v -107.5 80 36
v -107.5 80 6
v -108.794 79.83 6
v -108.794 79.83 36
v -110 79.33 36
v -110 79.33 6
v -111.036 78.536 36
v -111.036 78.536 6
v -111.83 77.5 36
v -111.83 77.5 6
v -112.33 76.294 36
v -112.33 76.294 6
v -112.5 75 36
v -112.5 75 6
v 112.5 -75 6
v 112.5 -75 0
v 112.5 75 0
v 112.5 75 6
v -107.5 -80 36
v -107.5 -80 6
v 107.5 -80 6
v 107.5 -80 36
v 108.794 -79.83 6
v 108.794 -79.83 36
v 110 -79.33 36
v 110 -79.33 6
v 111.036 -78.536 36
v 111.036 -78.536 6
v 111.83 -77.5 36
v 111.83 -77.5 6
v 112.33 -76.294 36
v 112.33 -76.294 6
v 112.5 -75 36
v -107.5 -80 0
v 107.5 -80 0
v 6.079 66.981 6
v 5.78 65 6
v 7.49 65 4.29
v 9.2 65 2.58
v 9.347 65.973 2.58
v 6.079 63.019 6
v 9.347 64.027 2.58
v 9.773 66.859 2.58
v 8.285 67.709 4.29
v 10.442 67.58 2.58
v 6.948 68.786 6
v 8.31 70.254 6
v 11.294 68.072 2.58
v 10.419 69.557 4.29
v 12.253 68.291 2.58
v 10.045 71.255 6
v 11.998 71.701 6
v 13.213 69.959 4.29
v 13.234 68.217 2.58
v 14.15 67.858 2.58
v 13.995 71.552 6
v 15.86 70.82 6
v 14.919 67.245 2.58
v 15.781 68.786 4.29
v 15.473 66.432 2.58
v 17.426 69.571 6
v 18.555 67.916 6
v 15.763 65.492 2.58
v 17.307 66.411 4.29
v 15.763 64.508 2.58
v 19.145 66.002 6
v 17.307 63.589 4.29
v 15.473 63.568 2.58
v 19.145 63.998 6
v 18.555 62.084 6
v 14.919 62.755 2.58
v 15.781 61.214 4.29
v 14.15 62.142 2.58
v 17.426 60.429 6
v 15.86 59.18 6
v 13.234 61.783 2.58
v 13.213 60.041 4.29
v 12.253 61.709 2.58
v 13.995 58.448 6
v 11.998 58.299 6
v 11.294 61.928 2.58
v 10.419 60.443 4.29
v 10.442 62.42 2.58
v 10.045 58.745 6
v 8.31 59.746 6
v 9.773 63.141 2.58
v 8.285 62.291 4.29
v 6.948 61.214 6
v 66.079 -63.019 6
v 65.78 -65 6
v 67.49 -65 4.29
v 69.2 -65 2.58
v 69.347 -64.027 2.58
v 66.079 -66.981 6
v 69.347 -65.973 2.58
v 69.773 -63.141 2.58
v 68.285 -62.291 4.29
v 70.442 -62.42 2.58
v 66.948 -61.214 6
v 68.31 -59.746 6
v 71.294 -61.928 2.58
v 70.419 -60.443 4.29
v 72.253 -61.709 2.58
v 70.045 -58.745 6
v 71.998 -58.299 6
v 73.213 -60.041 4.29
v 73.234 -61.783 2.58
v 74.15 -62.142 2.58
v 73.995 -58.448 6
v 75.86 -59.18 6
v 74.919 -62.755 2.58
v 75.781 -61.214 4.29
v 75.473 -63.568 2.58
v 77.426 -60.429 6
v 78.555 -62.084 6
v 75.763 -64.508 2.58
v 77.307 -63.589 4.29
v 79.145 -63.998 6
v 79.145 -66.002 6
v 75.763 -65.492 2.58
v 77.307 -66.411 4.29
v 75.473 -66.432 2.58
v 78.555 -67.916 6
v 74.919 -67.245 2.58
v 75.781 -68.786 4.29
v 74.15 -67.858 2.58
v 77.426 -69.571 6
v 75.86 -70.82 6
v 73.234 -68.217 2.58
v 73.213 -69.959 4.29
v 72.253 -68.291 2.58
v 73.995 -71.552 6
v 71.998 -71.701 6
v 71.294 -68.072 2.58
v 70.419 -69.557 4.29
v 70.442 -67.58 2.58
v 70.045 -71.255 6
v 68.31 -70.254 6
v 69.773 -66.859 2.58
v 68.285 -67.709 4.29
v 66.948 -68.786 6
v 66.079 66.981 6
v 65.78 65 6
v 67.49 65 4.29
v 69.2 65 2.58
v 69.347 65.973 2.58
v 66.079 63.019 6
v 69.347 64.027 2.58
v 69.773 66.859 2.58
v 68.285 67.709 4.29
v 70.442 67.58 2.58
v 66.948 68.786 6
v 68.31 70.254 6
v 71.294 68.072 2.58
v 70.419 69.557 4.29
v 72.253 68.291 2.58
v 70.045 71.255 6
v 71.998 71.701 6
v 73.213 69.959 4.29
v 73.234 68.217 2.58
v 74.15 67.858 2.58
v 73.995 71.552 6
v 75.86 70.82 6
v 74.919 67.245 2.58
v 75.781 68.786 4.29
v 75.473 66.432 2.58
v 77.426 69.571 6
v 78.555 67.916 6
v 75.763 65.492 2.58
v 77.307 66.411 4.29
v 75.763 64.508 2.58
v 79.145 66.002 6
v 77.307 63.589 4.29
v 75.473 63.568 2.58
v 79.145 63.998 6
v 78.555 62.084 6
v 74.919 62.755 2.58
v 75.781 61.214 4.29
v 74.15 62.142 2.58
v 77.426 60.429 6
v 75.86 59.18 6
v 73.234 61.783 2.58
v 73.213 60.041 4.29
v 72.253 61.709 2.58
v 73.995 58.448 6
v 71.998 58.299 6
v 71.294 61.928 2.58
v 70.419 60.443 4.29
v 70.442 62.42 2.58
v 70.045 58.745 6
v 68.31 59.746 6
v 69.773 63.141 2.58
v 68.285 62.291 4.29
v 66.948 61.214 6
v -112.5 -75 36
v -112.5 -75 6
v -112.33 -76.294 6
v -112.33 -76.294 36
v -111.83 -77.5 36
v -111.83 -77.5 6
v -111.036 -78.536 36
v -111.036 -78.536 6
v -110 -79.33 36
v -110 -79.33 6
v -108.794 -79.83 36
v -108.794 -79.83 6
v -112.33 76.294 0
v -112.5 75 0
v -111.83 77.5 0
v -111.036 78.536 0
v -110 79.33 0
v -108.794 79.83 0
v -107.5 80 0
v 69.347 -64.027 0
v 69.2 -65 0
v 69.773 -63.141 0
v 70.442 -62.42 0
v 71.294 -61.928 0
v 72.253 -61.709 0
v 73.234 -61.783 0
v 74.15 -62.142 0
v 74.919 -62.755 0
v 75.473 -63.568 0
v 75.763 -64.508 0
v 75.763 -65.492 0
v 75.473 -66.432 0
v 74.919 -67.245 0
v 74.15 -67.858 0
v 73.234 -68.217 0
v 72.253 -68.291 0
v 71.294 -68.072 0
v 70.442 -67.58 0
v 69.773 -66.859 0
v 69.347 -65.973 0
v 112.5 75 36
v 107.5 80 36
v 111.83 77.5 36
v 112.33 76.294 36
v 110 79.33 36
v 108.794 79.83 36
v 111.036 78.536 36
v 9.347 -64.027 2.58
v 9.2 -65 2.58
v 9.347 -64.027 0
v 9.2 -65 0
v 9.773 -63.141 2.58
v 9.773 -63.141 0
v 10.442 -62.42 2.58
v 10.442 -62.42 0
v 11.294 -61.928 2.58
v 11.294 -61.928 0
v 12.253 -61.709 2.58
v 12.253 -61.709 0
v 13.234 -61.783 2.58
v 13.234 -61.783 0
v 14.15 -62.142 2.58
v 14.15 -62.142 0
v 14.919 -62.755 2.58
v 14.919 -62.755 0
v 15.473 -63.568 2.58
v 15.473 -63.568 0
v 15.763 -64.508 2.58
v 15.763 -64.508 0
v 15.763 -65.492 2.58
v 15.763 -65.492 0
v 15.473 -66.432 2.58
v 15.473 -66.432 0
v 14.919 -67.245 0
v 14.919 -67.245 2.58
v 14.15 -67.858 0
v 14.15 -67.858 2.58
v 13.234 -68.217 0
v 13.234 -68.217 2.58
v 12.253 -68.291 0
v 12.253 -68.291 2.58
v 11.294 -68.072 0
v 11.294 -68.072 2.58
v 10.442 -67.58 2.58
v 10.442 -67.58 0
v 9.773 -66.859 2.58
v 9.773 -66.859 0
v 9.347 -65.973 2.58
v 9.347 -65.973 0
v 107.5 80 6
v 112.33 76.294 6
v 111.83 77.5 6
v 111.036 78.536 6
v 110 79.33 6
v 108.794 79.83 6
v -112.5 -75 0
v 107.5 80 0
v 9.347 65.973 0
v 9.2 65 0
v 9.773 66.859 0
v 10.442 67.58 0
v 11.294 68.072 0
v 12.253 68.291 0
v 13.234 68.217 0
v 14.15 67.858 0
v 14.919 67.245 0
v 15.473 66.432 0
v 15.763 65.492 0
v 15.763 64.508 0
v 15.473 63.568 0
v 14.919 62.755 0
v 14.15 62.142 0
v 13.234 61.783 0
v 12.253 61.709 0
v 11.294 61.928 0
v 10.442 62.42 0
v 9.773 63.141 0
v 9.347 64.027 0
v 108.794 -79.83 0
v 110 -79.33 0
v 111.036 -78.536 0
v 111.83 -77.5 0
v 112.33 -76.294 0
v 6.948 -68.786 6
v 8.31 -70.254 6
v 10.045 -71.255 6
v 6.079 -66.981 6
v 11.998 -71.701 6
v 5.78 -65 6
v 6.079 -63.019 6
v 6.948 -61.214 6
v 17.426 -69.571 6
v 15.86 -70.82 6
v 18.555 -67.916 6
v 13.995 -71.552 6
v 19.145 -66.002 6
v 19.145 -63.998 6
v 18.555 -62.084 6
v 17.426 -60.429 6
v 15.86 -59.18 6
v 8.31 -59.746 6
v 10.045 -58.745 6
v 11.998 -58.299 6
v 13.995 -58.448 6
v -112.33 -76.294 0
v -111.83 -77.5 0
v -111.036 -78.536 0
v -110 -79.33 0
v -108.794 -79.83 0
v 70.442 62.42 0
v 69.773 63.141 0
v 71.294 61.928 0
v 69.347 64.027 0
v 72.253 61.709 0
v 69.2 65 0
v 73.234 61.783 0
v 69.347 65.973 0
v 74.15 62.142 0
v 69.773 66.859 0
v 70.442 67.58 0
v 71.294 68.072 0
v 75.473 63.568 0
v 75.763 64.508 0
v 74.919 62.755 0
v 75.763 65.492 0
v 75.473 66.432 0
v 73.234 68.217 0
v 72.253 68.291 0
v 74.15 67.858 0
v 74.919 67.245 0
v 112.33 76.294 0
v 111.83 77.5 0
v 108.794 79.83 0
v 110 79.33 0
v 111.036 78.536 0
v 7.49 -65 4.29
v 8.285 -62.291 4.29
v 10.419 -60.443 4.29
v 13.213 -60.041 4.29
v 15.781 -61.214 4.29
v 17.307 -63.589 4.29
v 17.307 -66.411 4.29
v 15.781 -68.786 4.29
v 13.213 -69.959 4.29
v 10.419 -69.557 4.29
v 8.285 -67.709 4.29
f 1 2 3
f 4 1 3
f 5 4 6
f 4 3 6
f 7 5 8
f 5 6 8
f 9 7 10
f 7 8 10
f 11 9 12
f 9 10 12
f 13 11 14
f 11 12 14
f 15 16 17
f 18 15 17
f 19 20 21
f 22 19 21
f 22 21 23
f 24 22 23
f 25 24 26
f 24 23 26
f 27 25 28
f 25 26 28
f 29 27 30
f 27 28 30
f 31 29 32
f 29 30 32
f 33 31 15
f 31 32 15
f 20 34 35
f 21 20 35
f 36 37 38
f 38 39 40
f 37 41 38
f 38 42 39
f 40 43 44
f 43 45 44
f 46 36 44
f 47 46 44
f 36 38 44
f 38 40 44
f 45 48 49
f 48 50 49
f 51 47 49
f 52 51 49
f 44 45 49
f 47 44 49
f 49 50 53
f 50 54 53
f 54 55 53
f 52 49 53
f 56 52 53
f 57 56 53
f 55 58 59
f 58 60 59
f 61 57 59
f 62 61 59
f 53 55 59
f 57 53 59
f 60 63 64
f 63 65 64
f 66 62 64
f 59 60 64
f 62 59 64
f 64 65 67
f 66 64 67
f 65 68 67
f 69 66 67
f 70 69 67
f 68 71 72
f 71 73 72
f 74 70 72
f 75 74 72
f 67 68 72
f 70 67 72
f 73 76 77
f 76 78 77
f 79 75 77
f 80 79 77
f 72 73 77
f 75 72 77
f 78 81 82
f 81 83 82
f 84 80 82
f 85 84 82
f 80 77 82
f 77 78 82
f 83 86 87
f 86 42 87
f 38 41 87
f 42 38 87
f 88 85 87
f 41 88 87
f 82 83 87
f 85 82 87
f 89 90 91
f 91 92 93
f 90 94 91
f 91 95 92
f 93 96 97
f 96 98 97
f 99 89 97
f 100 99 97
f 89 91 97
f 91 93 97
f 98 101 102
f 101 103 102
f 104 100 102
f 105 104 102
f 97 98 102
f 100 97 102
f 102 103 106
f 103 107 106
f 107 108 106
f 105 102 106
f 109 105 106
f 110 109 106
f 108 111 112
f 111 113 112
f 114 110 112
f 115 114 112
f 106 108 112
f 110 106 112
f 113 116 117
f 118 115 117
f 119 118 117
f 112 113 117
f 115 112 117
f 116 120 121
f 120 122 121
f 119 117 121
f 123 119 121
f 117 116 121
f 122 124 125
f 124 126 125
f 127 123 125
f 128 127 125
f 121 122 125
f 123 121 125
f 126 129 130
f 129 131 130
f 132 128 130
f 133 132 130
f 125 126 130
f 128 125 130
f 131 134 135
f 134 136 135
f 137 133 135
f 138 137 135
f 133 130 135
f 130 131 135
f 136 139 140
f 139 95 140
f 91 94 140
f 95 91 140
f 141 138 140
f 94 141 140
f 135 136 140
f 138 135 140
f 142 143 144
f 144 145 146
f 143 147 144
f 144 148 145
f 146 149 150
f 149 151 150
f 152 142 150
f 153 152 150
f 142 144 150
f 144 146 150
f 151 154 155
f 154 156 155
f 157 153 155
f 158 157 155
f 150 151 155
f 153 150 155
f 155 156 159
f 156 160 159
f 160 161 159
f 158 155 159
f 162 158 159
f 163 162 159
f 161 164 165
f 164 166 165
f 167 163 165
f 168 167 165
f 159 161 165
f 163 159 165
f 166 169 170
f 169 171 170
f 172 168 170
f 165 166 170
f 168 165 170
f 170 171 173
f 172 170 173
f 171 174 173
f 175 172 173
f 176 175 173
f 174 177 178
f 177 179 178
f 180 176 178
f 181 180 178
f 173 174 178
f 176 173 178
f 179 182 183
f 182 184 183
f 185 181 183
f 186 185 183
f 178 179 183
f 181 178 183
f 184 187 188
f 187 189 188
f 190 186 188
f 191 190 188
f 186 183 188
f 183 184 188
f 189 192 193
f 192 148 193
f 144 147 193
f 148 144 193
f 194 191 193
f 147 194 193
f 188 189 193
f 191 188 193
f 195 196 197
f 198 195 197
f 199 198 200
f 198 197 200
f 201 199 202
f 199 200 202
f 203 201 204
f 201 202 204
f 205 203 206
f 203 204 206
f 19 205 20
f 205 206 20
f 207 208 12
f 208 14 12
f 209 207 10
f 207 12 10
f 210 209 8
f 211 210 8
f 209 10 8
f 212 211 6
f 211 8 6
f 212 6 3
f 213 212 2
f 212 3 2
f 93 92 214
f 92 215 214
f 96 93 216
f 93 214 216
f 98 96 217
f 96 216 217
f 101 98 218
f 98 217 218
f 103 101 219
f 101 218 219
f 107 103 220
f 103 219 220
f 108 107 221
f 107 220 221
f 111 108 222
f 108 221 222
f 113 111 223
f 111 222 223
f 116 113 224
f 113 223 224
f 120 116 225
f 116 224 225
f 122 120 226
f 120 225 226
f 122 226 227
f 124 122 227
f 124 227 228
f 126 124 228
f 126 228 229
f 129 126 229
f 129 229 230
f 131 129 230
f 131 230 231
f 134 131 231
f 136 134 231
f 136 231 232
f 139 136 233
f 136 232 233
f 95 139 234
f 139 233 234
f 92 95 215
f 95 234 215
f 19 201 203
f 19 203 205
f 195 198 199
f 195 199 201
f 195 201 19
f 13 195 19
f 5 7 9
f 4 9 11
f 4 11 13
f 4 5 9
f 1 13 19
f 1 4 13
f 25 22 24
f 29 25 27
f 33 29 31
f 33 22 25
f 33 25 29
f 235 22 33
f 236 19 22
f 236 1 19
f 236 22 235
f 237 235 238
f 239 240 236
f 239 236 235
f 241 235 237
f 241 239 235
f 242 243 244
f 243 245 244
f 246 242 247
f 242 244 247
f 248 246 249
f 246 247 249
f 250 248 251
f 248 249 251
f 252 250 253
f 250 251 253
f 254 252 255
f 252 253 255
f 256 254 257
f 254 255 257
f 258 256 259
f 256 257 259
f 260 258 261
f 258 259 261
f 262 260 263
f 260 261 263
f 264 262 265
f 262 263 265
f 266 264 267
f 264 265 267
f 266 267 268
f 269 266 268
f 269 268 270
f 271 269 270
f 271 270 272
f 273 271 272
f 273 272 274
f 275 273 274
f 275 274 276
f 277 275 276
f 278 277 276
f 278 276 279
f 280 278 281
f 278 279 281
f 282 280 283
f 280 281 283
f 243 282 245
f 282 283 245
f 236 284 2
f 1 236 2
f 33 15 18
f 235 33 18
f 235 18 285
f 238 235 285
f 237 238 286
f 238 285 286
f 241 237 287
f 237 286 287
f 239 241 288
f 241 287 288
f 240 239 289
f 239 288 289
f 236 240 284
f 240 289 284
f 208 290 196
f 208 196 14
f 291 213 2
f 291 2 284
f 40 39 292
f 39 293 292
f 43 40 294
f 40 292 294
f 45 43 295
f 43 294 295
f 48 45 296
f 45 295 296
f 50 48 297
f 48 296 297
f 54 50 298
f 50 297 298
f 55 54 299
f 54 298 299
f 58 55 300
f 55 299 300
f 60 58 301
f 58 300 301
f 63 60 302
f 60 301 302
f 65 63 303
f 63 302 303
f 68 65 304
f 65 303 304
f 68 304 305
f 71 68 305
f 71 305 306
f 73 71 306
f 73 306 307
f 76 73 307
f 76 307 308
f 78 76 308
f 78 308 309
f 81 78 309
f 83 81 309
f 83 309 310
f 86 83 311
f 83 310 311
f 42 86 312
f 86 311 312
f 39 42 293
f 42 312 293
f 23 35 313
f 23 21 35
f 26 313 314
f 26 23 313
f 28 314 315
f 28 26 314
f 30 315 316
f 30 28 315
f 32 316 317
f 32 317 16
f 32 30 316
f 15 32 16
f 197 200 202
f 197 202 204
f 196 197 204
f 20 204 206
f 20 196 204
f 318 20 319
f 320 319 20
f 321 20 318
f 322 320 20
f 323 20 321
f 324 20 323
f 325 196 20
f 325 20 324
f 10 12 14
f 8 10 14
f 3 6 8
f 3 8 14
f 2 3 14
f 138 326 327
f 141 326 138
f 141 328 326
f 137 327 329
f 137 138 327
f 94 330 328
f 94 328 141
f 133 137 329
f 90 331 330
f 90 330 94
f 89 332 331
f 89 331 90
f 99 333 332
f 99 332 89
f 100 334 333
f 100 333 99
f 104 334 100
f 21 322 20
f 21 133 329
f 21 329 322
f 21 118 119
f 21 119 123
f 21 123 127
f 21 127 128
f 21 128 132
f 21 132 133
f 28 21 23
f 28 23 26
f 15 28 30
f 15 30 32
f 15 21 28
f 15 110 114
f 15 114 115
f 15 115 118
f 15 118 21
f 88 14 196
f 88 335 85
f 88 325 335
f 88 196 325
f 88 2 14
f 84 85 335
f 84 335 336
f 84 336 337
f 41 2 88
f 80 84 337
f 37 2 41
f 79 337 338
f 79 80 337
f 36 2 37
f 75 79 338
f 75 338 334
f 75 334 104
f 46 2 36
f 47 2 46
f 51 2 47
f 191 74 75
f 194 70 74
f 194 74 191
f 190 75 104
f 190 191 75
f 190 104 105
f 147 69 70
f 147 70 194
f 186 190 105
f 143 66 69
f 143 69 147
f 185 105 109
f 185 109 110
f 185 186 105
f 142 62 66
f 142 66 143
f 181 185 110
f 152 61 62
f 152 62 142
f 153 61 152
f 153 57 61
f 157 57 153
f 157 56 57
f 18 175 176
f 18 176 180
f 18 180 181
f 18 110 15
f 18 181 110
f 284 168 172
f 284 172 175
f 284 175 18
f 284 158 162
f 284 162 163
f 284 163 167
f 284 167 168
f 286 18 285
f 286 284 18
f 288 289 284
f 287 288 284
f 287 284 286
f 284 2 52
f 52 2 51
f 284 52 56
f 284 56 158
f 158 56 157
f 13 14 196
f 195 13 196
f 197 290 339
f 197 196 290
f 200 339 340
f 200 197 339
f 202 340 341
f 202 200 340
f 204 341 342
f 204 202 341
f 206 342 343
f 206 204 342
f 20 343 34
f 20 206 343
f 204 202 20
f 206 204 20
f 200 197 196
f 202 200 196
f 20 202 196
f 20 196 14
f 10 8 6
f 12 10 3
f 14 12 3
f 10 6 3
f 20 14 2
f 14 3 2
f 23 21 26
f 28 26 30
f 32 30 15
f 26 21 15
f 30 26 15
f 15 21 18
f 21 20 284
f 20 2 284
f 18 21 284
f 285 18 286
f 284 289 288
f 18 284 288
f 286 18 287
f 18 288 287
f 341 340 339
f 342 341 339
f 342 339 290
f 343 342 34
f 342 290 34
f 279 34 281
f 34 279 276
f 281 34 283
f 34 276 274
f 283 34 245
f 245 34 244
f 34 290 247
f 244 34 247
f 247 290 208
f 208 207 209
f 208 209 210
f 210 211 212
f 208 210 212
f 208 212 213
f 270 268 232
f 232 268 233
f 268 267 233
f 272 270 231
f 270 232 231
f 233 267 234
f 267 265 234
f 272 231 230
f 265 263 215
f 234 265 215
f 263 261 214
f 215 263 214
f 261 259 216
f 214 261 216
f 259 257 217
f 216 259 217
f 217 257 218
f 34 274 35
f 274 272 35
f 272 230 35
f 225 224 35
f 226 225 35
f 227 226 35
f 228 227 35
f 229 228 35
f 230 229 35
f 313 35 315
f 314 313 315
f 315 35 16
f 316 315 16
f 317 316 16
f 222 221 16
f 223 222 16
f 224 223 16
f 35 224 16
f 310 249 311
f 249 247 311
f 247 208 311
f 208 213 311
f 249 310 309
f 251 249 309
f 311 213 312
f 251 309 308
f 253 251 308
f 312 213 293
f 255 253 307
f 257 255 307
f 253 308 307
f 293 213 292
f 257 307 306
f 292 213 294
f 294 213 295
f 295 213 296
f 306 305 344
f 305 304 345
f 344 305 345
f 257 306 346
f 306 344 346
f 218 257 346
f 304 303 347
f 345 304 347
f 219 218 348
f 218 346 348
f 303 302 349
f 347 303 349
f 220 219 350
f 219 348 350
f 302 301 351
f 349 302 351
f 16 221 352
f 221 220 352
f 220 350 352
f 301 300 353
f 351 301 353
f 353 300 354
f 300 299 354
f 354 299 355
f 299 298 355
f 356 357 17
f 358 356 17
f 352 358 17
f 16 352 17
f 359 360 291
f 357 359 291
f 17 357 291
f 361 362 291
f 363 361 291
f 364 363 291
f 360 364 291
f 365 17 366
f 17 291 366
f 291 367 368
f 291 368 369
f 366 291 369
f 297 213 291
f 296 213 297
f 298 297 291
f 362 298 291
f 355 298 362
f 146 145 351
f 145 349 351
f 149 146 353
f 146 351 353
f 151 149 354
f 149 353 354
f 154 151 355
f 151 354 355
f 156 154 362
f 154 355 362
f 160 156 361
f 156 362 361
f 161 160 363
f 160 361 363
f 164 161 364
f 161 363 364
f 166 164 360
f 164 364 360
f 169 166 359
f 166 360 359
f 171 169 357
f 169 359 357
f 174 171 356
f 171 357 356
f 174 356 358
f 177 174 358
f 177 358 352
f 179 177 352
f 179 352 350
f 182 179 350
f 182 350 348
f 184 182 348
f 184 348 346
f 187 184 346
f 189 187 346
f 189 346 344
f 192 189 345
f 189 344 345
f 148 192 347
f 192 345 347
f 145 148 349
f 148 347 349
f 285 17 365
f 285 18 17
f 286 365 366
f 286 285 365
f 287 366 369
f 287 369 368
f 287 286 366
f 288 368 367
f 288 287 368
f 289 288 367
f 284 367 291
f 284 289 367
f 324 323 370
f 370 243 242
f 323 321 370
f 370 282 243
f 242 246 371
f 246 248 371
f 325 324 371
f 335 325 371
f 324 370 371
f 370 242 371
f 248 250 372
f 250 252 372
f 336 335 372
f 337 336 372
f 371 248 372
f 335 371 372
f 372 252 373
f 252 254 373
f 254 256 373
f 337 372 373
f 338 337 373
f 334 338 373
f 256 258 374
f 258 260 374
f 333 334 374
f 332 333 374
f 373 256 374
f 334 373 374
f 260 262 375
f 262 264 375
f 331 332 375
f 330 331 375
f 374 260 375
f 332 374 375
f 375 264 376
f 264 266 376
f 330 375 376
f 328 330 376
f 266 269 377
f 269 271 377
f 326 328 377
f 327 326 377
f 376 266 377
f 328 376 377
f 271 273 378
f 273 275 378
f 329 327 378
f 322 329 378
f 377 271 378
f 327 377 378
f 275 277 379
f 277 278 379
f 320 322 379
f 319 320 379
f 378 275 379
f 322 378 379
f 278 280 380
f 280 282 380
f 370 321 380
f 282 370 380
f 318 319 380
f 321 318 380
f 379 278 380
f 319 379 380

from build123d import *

# Parameters (mm, degrees)
F0_W           = 225
F0_H           = 160
F1_DEPTH       = 6
F2_R           = 5
F4_D           = 6.6
F4_DEPTH       = 7
F4_CSINK_D     = 13.44
F4_CSINK_ANGLE = 90
F4_TIP         = 1.9828400428
F6_DEPTH       = 30


with BuildPart() as f1:
    # F0 (on Top) → F1 (new body)
    with BuildSketch(Plane.XY):
        Rectangle(F0_W, F0_H)
    extrude(amount=F1_DEPTH)

    # F2
    f2_edges = [f1.edges().sort_by_distance(p)[0] for p in [
        (112.5, -80, 3),
        (112.5, 80, 3),
        (-112.5, -80, 3),
        (-112.5, 80, 3),
    ]]
    fillet(f2_edges, radius=F2_R)

    # F4
    with Locations(Plane.XY.offset(6)):
        with Locations((12.5, -65), (72.5, -65), (72.5, 65), (12.5, 65)):
            CounterSinkHole(F4_D / 2, F4_CSINK_D / 2, depth=F4_DEPTH, counter_sink_angle=F4_CSINK_ANGLE)
            with Locations((0, 0, -(F4_DEPTH + F4_TIP / 2))):  # 118° drill point
                Cone(0, F4_D / 2, F4_TIP, mode=Mode.SUBTRACT)


with BuildPart() as f6:
    # F5 (on face) → F6 (new body)
    with BuildSketch(Plane.XY.offset(6)):
        with BuildLine():
            ThreePointArc((107.5, -80), (111.0355339059, -78.5355339059), (112.5, -75))
            Line((112.5, -75), (112.5, 75))
            ThreePointArc((112.5, 75), (111.0355339059, 78.5355339059), (107.5, 80))
            Line((107.5, 80), (-107.5, 80))
            ThreePointArc((-107.5, 80), (-111.0355339059, 78.5355339059), (-112.5, 75))
            Line((-112.5, 75), (-112.5, -75))
            ThreePointArc((-112.5, -75), (-111.0355339059, -78.5355339059), (-107.5, -80))
            Line((-107.5, -80), (107.5, -80))
        make_face()
    extrude(amount=F6_DEPTH)


solid = Compound([f1.part, f6.part])
